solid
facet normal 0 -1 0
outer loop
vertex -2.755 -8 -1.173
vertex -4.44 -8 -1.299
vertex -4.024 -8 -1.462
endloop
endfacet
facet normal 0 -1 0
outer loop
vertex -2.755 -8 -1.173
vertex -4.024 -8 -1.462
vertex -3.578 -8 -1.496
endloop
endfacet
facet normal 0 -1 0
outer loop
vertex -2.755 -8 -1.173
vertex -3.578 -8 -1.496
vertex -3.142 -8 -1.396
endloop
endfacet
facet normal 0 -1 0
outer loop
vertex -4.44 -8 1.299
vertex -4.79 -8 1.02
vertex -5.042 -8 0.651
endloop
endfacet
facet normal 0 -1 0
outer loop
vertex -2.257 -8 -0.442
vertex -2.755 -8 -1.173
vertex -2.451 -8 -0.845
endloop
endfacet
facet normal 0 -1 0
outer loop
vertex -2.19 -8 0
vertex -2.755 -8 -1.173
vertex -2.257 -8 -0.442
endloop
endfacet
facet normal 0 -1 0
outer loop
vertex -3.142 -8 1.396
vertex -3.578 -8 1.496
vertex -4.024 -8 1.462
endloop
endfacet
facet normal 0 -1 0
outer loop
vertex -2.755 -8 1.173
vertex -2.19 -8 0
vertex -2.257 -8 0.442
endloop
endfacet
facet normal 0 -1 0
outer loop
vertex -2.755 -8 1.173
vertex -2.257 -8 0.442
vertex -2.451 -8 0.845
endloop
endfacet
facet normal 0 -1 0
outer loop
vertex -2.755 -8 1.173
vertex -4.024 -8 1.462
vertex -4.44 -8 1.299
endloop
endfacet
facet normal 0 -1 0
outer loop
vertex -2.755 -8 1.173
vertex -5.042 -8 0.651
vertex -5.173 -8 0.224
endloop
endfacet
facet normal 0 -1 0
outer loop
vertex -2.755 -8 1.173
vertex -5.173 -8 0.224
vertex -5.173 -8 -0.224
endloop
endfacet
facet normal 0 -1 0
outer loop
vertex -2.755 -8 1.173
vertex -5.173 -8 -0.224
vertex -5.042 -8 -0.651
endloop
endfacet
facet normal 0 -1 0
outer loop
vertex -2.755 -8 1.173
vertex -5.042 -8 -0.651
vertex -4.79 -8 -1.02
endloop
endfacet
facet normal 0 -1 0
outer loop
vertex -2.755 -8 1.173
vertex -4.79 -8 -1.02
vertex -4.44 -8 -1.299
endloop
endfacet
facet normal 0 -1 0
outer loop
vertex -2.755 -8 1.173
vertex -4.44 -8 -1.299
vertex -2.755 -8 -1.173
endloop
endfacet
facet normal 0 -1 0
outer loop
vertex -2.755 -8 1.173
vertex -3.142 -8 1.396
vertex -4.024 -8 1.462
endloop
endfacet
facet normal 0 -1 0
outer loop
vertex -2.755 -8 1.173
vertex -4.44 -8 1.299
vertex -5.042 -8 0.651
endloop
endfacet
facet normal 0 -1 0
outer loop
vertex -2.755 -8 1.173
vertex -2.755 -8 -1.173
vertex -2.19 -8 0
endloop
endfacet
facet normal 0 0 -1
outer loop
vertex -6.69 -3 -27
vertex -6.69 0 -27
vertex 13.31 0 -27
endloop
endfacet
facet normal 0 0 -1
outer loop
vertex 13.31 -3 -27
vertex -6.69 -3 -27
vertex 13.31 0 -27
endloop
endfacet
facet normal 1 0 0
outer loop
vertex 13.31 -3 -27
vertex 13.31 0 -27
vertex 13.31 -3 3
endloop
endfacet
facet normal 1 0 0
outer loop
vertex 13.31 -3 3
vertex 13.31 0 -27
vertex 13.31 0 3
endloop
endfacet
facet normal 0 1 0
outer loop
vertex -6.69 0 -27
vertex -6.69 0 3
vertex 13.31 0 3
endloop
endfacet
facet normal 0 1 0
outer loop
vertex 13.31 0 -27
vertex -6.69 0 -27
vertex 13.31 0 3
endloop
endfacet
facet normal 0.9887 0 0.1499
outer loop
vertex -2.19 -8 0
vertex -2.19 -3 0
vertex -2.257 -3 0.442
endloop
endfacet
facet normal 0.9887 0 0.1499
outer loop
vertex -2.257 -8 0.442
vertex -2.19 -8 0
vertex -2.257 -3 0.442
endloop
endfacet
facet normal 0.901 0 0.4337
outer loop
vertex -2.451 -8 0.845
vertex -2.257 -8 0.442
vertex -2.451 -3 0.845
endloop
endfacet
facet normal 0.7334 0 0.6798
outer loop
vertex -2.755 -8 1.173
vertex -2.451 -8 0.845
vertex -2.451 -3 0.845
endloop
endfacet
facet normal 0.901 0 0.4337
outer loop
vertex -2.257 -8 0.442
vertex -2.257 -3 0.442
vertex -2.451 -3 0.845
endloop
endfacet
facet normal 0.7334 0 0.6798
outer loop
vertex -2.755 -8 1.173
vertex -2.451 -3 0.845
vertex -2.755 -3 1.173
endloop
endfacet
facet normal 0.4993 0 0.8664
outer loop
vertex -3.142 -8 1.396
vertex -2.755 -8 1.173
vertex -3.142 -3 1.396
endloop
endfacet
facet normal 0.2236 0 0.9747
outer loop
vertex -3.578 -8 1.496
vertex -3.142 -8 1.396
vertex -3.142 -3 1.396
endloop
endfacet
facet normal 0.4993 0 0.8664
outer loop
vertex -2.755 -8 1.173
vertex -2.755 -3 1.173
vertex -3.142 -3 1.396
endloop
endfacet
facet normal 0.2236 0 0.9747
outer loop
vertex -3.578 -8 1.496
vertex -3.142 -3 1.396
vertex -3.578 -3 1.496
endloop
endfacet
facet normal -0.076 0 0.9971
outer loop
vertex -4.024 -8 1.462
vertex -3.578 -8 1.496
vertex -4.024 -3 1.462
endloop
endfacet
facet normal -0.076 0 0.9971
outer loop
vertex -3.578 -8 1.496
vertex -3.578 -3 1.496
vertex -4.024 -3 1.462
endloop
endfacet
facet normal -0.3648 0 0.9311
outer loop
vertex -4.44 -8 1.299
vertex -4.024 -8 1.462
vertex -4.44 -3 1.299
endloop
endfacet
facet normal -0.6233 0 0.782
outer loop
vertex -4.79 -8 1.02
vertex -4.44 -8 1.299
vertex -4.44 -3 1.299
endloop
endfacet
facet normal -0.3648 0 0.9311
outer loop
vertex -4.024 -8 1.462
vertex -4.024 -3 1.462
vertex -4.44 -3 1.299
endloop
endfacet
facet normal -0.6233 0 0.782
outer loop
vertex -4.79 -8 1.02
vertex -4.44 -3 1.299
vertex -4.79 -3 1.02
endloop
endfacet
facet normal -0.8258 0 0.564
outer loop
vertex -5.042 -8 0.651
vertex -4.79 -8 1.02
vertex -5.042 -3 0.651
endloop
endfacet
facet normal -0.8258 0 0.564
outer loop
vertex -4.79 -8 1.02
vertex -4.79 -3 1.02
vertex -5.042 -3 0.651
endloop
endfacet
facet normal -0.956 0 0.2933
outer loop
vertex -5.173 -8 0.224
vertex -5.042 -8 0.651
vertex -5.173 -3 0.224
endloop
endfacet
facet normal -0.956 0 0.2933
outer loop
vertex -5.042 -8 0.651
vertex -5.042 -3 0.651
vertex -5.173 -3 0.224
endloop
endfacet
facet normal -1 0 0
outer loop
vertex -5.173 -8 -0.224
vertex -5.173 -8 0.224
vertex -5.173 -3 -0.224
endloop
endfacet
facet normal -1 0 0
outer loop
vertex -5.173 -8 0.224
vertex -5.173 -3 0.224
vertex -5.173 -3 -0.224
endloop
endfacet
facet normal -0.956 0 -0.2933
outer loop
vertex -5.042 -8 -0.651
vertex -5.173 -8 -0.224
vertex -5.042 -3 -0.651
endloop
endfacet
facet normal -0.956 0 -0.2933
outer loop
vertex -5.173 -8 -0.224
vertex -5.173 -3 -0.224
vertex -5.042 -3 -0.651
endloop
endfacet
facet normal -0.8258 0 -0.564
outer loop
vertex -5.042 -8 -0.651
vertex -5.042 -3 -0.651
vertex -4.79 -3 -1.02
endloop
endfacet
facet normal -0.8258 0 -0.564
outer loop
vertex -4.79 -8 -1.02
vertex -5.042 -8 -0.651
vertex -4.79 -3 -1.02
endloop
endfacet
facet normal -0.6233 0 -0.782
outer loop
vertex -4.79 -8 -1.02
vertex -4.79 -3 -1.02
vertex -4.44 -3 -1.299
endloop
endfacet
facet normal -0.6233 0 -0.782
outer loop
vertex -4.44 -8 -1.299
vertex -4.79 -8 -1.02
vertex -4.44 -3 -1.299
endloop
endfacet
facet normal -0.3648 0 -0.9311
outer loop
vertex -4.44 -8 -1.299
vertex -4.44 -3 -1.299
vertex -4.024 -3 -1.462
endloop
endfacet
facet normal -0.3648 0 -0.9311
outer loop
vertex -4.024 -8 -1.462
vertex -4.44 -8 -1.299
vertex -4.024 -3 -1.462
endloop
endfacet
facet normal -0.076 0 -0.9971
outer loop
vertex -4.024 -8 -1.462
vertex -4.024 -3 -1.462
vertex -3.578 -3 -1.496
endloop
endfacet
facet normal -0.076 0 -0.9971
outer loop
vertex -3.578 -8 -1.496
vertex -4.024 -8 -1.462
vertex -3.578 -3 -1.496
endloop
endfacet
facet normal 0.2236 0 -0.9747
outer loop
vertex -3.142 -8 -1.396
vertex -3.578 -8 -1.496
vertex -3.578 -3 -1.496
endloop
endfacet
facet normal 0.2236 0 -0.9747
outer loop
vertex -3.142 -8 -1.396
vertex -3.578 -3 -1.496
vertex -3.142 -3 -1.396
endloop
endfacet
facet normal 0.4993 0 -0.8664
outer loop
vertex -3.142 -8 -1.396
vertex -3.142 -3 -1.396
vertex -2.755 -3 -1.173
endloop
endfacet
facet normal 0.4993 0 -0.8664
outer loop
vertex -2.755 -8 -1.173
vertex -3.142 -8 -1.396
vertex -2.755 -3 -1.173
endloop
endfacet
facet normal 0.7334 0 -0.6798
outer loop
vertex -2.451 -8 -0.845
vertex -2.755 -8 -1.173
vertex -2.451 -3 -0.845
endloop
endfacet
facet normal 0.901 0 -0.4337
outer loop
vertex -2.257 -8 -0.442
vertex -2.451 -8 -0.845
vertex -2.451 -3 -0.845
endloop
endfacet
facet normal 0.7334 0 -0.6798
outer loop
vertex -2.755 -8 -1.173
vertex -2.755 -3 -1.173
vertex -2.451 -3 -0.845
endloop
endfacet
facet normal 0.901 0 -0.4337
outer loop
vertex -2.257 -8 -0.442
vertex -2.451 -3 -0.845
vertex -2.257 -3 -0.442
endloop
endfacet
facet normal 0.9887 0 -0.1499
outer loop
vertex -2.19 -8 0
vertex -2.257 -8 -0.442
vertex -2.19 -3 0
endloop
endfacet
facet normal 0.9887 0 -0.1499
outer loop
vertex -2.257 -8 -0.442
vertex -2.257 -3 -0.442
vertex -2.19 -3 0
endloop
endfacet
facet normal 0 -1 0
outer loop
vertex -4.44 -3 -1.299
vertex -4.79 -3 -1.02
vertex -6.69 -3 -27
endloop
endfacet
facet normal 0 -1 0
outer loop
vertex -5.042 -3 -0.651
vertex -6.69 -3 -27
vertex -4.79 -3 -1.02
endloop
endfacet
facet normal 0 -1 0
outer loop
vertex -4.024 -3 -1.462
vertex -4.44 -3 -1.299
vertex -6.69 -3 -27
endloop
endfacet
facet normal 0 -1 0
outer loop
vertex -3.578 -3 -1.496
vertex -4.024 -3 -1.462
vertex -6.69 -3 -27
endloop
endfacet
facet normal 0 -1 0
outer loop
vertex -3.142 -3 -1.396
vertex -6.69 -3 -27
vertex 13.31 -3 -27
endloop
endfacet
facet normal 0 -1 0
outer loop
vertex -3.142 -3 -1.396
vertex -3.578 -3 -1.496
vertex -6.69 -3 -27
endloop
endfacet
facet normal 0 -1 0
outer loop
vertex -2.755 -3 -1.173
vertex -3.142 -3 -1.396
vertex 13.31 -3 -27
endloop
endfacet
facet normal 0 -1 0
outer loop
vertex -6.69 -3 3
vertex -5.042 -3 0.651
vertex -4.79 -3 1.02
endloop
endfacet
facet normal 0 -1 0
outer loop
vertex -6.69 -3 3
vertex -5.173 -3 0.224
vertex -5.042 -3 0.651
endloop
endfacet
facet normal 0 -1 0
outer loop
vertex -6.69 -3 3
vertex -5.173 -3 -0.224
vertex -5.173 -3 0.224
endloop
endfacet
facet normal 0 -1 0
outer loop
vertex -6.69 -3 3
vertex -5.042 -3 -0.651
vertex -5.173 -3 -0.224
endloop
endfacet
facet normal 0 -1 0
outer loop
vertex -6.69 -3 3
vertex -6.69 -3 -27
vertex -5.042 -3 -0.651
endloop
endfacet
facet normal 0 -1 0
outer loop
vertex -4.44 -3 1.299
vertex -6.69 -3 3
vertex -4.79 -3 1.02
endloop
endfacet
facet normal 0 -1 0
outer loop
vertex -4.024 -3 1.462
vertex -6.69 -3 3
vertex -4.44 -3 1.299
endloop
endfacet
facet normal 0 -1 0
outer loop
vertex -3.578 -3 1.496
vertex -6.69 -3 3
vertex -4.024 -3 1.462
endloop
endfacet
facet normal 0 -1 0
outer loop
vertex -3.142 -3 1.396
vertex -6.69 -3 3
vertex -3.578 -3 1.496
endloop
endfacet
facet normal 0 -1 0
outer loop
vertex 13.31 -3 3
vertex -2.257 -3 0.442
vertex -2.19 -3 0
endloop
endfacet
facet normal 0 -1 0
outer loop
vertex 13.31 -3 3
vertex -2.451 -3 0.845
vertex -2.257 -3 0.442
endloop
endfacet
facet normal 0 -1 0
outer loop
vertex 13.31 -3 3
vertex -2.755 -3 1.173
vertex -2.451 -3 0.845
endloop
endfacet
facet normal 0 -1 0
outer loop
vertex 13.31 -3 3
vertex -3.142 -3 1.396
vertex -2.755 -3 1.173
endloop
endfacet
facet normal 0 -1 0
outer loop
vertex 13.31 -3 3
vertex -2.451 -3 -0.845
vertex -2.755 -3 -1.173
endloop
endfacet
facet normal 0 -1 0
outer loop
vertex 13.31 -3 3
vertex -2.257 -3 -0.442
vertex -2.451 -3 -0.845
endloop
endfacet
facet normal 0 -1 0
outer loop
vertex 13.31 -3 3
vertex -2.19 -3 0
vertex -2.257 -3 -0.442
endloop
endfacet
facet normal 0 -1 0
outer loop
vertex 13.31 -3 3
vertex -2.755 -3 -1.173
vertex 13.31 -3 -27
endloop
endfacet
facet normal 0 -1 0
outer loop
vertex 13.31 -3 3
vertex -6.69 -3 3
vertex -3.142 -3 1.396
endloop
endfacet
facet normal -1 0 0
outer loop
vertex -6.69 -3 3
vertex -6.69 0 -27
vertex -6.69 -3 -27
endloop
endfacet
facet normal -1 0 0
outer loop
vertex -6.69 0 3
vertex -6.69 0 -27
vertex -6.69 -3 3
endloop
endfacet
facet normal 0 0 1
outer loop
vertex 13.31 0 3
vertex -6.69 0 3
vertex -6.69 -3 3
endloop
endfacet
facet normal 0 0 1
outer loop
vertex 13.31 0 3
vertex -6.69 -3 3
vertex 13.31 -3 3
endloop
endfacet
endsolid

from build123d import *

# Parameters (mm, degrees)
F0_W     = 20
F0_H     = 30
F1_DEPTH = 3
F2_R     = 1.5
F3_DEPTH = 5


# Not quite as in the source:
# - a feature names something its author has since deleted; it is built from what else it names


with BuildPart() as f1:
    # F0 (on Front) → F1 (new body)
    with BuildSketch(Plane.XZ):
        with Locations((3.3097672276, -12)):
            Rectangle(F0_W, F0_H)
    extrude(amount=F1_DEPTH)

    # F2 (on face) → F3 (join)
    with BuildSketch(Plane.XZ.offset(3)):
        with Locations((-3.6902327724, 0)):
            Circle(F2_R)
    extrude(amount=F3_DEPTH)


solid = f1.part
